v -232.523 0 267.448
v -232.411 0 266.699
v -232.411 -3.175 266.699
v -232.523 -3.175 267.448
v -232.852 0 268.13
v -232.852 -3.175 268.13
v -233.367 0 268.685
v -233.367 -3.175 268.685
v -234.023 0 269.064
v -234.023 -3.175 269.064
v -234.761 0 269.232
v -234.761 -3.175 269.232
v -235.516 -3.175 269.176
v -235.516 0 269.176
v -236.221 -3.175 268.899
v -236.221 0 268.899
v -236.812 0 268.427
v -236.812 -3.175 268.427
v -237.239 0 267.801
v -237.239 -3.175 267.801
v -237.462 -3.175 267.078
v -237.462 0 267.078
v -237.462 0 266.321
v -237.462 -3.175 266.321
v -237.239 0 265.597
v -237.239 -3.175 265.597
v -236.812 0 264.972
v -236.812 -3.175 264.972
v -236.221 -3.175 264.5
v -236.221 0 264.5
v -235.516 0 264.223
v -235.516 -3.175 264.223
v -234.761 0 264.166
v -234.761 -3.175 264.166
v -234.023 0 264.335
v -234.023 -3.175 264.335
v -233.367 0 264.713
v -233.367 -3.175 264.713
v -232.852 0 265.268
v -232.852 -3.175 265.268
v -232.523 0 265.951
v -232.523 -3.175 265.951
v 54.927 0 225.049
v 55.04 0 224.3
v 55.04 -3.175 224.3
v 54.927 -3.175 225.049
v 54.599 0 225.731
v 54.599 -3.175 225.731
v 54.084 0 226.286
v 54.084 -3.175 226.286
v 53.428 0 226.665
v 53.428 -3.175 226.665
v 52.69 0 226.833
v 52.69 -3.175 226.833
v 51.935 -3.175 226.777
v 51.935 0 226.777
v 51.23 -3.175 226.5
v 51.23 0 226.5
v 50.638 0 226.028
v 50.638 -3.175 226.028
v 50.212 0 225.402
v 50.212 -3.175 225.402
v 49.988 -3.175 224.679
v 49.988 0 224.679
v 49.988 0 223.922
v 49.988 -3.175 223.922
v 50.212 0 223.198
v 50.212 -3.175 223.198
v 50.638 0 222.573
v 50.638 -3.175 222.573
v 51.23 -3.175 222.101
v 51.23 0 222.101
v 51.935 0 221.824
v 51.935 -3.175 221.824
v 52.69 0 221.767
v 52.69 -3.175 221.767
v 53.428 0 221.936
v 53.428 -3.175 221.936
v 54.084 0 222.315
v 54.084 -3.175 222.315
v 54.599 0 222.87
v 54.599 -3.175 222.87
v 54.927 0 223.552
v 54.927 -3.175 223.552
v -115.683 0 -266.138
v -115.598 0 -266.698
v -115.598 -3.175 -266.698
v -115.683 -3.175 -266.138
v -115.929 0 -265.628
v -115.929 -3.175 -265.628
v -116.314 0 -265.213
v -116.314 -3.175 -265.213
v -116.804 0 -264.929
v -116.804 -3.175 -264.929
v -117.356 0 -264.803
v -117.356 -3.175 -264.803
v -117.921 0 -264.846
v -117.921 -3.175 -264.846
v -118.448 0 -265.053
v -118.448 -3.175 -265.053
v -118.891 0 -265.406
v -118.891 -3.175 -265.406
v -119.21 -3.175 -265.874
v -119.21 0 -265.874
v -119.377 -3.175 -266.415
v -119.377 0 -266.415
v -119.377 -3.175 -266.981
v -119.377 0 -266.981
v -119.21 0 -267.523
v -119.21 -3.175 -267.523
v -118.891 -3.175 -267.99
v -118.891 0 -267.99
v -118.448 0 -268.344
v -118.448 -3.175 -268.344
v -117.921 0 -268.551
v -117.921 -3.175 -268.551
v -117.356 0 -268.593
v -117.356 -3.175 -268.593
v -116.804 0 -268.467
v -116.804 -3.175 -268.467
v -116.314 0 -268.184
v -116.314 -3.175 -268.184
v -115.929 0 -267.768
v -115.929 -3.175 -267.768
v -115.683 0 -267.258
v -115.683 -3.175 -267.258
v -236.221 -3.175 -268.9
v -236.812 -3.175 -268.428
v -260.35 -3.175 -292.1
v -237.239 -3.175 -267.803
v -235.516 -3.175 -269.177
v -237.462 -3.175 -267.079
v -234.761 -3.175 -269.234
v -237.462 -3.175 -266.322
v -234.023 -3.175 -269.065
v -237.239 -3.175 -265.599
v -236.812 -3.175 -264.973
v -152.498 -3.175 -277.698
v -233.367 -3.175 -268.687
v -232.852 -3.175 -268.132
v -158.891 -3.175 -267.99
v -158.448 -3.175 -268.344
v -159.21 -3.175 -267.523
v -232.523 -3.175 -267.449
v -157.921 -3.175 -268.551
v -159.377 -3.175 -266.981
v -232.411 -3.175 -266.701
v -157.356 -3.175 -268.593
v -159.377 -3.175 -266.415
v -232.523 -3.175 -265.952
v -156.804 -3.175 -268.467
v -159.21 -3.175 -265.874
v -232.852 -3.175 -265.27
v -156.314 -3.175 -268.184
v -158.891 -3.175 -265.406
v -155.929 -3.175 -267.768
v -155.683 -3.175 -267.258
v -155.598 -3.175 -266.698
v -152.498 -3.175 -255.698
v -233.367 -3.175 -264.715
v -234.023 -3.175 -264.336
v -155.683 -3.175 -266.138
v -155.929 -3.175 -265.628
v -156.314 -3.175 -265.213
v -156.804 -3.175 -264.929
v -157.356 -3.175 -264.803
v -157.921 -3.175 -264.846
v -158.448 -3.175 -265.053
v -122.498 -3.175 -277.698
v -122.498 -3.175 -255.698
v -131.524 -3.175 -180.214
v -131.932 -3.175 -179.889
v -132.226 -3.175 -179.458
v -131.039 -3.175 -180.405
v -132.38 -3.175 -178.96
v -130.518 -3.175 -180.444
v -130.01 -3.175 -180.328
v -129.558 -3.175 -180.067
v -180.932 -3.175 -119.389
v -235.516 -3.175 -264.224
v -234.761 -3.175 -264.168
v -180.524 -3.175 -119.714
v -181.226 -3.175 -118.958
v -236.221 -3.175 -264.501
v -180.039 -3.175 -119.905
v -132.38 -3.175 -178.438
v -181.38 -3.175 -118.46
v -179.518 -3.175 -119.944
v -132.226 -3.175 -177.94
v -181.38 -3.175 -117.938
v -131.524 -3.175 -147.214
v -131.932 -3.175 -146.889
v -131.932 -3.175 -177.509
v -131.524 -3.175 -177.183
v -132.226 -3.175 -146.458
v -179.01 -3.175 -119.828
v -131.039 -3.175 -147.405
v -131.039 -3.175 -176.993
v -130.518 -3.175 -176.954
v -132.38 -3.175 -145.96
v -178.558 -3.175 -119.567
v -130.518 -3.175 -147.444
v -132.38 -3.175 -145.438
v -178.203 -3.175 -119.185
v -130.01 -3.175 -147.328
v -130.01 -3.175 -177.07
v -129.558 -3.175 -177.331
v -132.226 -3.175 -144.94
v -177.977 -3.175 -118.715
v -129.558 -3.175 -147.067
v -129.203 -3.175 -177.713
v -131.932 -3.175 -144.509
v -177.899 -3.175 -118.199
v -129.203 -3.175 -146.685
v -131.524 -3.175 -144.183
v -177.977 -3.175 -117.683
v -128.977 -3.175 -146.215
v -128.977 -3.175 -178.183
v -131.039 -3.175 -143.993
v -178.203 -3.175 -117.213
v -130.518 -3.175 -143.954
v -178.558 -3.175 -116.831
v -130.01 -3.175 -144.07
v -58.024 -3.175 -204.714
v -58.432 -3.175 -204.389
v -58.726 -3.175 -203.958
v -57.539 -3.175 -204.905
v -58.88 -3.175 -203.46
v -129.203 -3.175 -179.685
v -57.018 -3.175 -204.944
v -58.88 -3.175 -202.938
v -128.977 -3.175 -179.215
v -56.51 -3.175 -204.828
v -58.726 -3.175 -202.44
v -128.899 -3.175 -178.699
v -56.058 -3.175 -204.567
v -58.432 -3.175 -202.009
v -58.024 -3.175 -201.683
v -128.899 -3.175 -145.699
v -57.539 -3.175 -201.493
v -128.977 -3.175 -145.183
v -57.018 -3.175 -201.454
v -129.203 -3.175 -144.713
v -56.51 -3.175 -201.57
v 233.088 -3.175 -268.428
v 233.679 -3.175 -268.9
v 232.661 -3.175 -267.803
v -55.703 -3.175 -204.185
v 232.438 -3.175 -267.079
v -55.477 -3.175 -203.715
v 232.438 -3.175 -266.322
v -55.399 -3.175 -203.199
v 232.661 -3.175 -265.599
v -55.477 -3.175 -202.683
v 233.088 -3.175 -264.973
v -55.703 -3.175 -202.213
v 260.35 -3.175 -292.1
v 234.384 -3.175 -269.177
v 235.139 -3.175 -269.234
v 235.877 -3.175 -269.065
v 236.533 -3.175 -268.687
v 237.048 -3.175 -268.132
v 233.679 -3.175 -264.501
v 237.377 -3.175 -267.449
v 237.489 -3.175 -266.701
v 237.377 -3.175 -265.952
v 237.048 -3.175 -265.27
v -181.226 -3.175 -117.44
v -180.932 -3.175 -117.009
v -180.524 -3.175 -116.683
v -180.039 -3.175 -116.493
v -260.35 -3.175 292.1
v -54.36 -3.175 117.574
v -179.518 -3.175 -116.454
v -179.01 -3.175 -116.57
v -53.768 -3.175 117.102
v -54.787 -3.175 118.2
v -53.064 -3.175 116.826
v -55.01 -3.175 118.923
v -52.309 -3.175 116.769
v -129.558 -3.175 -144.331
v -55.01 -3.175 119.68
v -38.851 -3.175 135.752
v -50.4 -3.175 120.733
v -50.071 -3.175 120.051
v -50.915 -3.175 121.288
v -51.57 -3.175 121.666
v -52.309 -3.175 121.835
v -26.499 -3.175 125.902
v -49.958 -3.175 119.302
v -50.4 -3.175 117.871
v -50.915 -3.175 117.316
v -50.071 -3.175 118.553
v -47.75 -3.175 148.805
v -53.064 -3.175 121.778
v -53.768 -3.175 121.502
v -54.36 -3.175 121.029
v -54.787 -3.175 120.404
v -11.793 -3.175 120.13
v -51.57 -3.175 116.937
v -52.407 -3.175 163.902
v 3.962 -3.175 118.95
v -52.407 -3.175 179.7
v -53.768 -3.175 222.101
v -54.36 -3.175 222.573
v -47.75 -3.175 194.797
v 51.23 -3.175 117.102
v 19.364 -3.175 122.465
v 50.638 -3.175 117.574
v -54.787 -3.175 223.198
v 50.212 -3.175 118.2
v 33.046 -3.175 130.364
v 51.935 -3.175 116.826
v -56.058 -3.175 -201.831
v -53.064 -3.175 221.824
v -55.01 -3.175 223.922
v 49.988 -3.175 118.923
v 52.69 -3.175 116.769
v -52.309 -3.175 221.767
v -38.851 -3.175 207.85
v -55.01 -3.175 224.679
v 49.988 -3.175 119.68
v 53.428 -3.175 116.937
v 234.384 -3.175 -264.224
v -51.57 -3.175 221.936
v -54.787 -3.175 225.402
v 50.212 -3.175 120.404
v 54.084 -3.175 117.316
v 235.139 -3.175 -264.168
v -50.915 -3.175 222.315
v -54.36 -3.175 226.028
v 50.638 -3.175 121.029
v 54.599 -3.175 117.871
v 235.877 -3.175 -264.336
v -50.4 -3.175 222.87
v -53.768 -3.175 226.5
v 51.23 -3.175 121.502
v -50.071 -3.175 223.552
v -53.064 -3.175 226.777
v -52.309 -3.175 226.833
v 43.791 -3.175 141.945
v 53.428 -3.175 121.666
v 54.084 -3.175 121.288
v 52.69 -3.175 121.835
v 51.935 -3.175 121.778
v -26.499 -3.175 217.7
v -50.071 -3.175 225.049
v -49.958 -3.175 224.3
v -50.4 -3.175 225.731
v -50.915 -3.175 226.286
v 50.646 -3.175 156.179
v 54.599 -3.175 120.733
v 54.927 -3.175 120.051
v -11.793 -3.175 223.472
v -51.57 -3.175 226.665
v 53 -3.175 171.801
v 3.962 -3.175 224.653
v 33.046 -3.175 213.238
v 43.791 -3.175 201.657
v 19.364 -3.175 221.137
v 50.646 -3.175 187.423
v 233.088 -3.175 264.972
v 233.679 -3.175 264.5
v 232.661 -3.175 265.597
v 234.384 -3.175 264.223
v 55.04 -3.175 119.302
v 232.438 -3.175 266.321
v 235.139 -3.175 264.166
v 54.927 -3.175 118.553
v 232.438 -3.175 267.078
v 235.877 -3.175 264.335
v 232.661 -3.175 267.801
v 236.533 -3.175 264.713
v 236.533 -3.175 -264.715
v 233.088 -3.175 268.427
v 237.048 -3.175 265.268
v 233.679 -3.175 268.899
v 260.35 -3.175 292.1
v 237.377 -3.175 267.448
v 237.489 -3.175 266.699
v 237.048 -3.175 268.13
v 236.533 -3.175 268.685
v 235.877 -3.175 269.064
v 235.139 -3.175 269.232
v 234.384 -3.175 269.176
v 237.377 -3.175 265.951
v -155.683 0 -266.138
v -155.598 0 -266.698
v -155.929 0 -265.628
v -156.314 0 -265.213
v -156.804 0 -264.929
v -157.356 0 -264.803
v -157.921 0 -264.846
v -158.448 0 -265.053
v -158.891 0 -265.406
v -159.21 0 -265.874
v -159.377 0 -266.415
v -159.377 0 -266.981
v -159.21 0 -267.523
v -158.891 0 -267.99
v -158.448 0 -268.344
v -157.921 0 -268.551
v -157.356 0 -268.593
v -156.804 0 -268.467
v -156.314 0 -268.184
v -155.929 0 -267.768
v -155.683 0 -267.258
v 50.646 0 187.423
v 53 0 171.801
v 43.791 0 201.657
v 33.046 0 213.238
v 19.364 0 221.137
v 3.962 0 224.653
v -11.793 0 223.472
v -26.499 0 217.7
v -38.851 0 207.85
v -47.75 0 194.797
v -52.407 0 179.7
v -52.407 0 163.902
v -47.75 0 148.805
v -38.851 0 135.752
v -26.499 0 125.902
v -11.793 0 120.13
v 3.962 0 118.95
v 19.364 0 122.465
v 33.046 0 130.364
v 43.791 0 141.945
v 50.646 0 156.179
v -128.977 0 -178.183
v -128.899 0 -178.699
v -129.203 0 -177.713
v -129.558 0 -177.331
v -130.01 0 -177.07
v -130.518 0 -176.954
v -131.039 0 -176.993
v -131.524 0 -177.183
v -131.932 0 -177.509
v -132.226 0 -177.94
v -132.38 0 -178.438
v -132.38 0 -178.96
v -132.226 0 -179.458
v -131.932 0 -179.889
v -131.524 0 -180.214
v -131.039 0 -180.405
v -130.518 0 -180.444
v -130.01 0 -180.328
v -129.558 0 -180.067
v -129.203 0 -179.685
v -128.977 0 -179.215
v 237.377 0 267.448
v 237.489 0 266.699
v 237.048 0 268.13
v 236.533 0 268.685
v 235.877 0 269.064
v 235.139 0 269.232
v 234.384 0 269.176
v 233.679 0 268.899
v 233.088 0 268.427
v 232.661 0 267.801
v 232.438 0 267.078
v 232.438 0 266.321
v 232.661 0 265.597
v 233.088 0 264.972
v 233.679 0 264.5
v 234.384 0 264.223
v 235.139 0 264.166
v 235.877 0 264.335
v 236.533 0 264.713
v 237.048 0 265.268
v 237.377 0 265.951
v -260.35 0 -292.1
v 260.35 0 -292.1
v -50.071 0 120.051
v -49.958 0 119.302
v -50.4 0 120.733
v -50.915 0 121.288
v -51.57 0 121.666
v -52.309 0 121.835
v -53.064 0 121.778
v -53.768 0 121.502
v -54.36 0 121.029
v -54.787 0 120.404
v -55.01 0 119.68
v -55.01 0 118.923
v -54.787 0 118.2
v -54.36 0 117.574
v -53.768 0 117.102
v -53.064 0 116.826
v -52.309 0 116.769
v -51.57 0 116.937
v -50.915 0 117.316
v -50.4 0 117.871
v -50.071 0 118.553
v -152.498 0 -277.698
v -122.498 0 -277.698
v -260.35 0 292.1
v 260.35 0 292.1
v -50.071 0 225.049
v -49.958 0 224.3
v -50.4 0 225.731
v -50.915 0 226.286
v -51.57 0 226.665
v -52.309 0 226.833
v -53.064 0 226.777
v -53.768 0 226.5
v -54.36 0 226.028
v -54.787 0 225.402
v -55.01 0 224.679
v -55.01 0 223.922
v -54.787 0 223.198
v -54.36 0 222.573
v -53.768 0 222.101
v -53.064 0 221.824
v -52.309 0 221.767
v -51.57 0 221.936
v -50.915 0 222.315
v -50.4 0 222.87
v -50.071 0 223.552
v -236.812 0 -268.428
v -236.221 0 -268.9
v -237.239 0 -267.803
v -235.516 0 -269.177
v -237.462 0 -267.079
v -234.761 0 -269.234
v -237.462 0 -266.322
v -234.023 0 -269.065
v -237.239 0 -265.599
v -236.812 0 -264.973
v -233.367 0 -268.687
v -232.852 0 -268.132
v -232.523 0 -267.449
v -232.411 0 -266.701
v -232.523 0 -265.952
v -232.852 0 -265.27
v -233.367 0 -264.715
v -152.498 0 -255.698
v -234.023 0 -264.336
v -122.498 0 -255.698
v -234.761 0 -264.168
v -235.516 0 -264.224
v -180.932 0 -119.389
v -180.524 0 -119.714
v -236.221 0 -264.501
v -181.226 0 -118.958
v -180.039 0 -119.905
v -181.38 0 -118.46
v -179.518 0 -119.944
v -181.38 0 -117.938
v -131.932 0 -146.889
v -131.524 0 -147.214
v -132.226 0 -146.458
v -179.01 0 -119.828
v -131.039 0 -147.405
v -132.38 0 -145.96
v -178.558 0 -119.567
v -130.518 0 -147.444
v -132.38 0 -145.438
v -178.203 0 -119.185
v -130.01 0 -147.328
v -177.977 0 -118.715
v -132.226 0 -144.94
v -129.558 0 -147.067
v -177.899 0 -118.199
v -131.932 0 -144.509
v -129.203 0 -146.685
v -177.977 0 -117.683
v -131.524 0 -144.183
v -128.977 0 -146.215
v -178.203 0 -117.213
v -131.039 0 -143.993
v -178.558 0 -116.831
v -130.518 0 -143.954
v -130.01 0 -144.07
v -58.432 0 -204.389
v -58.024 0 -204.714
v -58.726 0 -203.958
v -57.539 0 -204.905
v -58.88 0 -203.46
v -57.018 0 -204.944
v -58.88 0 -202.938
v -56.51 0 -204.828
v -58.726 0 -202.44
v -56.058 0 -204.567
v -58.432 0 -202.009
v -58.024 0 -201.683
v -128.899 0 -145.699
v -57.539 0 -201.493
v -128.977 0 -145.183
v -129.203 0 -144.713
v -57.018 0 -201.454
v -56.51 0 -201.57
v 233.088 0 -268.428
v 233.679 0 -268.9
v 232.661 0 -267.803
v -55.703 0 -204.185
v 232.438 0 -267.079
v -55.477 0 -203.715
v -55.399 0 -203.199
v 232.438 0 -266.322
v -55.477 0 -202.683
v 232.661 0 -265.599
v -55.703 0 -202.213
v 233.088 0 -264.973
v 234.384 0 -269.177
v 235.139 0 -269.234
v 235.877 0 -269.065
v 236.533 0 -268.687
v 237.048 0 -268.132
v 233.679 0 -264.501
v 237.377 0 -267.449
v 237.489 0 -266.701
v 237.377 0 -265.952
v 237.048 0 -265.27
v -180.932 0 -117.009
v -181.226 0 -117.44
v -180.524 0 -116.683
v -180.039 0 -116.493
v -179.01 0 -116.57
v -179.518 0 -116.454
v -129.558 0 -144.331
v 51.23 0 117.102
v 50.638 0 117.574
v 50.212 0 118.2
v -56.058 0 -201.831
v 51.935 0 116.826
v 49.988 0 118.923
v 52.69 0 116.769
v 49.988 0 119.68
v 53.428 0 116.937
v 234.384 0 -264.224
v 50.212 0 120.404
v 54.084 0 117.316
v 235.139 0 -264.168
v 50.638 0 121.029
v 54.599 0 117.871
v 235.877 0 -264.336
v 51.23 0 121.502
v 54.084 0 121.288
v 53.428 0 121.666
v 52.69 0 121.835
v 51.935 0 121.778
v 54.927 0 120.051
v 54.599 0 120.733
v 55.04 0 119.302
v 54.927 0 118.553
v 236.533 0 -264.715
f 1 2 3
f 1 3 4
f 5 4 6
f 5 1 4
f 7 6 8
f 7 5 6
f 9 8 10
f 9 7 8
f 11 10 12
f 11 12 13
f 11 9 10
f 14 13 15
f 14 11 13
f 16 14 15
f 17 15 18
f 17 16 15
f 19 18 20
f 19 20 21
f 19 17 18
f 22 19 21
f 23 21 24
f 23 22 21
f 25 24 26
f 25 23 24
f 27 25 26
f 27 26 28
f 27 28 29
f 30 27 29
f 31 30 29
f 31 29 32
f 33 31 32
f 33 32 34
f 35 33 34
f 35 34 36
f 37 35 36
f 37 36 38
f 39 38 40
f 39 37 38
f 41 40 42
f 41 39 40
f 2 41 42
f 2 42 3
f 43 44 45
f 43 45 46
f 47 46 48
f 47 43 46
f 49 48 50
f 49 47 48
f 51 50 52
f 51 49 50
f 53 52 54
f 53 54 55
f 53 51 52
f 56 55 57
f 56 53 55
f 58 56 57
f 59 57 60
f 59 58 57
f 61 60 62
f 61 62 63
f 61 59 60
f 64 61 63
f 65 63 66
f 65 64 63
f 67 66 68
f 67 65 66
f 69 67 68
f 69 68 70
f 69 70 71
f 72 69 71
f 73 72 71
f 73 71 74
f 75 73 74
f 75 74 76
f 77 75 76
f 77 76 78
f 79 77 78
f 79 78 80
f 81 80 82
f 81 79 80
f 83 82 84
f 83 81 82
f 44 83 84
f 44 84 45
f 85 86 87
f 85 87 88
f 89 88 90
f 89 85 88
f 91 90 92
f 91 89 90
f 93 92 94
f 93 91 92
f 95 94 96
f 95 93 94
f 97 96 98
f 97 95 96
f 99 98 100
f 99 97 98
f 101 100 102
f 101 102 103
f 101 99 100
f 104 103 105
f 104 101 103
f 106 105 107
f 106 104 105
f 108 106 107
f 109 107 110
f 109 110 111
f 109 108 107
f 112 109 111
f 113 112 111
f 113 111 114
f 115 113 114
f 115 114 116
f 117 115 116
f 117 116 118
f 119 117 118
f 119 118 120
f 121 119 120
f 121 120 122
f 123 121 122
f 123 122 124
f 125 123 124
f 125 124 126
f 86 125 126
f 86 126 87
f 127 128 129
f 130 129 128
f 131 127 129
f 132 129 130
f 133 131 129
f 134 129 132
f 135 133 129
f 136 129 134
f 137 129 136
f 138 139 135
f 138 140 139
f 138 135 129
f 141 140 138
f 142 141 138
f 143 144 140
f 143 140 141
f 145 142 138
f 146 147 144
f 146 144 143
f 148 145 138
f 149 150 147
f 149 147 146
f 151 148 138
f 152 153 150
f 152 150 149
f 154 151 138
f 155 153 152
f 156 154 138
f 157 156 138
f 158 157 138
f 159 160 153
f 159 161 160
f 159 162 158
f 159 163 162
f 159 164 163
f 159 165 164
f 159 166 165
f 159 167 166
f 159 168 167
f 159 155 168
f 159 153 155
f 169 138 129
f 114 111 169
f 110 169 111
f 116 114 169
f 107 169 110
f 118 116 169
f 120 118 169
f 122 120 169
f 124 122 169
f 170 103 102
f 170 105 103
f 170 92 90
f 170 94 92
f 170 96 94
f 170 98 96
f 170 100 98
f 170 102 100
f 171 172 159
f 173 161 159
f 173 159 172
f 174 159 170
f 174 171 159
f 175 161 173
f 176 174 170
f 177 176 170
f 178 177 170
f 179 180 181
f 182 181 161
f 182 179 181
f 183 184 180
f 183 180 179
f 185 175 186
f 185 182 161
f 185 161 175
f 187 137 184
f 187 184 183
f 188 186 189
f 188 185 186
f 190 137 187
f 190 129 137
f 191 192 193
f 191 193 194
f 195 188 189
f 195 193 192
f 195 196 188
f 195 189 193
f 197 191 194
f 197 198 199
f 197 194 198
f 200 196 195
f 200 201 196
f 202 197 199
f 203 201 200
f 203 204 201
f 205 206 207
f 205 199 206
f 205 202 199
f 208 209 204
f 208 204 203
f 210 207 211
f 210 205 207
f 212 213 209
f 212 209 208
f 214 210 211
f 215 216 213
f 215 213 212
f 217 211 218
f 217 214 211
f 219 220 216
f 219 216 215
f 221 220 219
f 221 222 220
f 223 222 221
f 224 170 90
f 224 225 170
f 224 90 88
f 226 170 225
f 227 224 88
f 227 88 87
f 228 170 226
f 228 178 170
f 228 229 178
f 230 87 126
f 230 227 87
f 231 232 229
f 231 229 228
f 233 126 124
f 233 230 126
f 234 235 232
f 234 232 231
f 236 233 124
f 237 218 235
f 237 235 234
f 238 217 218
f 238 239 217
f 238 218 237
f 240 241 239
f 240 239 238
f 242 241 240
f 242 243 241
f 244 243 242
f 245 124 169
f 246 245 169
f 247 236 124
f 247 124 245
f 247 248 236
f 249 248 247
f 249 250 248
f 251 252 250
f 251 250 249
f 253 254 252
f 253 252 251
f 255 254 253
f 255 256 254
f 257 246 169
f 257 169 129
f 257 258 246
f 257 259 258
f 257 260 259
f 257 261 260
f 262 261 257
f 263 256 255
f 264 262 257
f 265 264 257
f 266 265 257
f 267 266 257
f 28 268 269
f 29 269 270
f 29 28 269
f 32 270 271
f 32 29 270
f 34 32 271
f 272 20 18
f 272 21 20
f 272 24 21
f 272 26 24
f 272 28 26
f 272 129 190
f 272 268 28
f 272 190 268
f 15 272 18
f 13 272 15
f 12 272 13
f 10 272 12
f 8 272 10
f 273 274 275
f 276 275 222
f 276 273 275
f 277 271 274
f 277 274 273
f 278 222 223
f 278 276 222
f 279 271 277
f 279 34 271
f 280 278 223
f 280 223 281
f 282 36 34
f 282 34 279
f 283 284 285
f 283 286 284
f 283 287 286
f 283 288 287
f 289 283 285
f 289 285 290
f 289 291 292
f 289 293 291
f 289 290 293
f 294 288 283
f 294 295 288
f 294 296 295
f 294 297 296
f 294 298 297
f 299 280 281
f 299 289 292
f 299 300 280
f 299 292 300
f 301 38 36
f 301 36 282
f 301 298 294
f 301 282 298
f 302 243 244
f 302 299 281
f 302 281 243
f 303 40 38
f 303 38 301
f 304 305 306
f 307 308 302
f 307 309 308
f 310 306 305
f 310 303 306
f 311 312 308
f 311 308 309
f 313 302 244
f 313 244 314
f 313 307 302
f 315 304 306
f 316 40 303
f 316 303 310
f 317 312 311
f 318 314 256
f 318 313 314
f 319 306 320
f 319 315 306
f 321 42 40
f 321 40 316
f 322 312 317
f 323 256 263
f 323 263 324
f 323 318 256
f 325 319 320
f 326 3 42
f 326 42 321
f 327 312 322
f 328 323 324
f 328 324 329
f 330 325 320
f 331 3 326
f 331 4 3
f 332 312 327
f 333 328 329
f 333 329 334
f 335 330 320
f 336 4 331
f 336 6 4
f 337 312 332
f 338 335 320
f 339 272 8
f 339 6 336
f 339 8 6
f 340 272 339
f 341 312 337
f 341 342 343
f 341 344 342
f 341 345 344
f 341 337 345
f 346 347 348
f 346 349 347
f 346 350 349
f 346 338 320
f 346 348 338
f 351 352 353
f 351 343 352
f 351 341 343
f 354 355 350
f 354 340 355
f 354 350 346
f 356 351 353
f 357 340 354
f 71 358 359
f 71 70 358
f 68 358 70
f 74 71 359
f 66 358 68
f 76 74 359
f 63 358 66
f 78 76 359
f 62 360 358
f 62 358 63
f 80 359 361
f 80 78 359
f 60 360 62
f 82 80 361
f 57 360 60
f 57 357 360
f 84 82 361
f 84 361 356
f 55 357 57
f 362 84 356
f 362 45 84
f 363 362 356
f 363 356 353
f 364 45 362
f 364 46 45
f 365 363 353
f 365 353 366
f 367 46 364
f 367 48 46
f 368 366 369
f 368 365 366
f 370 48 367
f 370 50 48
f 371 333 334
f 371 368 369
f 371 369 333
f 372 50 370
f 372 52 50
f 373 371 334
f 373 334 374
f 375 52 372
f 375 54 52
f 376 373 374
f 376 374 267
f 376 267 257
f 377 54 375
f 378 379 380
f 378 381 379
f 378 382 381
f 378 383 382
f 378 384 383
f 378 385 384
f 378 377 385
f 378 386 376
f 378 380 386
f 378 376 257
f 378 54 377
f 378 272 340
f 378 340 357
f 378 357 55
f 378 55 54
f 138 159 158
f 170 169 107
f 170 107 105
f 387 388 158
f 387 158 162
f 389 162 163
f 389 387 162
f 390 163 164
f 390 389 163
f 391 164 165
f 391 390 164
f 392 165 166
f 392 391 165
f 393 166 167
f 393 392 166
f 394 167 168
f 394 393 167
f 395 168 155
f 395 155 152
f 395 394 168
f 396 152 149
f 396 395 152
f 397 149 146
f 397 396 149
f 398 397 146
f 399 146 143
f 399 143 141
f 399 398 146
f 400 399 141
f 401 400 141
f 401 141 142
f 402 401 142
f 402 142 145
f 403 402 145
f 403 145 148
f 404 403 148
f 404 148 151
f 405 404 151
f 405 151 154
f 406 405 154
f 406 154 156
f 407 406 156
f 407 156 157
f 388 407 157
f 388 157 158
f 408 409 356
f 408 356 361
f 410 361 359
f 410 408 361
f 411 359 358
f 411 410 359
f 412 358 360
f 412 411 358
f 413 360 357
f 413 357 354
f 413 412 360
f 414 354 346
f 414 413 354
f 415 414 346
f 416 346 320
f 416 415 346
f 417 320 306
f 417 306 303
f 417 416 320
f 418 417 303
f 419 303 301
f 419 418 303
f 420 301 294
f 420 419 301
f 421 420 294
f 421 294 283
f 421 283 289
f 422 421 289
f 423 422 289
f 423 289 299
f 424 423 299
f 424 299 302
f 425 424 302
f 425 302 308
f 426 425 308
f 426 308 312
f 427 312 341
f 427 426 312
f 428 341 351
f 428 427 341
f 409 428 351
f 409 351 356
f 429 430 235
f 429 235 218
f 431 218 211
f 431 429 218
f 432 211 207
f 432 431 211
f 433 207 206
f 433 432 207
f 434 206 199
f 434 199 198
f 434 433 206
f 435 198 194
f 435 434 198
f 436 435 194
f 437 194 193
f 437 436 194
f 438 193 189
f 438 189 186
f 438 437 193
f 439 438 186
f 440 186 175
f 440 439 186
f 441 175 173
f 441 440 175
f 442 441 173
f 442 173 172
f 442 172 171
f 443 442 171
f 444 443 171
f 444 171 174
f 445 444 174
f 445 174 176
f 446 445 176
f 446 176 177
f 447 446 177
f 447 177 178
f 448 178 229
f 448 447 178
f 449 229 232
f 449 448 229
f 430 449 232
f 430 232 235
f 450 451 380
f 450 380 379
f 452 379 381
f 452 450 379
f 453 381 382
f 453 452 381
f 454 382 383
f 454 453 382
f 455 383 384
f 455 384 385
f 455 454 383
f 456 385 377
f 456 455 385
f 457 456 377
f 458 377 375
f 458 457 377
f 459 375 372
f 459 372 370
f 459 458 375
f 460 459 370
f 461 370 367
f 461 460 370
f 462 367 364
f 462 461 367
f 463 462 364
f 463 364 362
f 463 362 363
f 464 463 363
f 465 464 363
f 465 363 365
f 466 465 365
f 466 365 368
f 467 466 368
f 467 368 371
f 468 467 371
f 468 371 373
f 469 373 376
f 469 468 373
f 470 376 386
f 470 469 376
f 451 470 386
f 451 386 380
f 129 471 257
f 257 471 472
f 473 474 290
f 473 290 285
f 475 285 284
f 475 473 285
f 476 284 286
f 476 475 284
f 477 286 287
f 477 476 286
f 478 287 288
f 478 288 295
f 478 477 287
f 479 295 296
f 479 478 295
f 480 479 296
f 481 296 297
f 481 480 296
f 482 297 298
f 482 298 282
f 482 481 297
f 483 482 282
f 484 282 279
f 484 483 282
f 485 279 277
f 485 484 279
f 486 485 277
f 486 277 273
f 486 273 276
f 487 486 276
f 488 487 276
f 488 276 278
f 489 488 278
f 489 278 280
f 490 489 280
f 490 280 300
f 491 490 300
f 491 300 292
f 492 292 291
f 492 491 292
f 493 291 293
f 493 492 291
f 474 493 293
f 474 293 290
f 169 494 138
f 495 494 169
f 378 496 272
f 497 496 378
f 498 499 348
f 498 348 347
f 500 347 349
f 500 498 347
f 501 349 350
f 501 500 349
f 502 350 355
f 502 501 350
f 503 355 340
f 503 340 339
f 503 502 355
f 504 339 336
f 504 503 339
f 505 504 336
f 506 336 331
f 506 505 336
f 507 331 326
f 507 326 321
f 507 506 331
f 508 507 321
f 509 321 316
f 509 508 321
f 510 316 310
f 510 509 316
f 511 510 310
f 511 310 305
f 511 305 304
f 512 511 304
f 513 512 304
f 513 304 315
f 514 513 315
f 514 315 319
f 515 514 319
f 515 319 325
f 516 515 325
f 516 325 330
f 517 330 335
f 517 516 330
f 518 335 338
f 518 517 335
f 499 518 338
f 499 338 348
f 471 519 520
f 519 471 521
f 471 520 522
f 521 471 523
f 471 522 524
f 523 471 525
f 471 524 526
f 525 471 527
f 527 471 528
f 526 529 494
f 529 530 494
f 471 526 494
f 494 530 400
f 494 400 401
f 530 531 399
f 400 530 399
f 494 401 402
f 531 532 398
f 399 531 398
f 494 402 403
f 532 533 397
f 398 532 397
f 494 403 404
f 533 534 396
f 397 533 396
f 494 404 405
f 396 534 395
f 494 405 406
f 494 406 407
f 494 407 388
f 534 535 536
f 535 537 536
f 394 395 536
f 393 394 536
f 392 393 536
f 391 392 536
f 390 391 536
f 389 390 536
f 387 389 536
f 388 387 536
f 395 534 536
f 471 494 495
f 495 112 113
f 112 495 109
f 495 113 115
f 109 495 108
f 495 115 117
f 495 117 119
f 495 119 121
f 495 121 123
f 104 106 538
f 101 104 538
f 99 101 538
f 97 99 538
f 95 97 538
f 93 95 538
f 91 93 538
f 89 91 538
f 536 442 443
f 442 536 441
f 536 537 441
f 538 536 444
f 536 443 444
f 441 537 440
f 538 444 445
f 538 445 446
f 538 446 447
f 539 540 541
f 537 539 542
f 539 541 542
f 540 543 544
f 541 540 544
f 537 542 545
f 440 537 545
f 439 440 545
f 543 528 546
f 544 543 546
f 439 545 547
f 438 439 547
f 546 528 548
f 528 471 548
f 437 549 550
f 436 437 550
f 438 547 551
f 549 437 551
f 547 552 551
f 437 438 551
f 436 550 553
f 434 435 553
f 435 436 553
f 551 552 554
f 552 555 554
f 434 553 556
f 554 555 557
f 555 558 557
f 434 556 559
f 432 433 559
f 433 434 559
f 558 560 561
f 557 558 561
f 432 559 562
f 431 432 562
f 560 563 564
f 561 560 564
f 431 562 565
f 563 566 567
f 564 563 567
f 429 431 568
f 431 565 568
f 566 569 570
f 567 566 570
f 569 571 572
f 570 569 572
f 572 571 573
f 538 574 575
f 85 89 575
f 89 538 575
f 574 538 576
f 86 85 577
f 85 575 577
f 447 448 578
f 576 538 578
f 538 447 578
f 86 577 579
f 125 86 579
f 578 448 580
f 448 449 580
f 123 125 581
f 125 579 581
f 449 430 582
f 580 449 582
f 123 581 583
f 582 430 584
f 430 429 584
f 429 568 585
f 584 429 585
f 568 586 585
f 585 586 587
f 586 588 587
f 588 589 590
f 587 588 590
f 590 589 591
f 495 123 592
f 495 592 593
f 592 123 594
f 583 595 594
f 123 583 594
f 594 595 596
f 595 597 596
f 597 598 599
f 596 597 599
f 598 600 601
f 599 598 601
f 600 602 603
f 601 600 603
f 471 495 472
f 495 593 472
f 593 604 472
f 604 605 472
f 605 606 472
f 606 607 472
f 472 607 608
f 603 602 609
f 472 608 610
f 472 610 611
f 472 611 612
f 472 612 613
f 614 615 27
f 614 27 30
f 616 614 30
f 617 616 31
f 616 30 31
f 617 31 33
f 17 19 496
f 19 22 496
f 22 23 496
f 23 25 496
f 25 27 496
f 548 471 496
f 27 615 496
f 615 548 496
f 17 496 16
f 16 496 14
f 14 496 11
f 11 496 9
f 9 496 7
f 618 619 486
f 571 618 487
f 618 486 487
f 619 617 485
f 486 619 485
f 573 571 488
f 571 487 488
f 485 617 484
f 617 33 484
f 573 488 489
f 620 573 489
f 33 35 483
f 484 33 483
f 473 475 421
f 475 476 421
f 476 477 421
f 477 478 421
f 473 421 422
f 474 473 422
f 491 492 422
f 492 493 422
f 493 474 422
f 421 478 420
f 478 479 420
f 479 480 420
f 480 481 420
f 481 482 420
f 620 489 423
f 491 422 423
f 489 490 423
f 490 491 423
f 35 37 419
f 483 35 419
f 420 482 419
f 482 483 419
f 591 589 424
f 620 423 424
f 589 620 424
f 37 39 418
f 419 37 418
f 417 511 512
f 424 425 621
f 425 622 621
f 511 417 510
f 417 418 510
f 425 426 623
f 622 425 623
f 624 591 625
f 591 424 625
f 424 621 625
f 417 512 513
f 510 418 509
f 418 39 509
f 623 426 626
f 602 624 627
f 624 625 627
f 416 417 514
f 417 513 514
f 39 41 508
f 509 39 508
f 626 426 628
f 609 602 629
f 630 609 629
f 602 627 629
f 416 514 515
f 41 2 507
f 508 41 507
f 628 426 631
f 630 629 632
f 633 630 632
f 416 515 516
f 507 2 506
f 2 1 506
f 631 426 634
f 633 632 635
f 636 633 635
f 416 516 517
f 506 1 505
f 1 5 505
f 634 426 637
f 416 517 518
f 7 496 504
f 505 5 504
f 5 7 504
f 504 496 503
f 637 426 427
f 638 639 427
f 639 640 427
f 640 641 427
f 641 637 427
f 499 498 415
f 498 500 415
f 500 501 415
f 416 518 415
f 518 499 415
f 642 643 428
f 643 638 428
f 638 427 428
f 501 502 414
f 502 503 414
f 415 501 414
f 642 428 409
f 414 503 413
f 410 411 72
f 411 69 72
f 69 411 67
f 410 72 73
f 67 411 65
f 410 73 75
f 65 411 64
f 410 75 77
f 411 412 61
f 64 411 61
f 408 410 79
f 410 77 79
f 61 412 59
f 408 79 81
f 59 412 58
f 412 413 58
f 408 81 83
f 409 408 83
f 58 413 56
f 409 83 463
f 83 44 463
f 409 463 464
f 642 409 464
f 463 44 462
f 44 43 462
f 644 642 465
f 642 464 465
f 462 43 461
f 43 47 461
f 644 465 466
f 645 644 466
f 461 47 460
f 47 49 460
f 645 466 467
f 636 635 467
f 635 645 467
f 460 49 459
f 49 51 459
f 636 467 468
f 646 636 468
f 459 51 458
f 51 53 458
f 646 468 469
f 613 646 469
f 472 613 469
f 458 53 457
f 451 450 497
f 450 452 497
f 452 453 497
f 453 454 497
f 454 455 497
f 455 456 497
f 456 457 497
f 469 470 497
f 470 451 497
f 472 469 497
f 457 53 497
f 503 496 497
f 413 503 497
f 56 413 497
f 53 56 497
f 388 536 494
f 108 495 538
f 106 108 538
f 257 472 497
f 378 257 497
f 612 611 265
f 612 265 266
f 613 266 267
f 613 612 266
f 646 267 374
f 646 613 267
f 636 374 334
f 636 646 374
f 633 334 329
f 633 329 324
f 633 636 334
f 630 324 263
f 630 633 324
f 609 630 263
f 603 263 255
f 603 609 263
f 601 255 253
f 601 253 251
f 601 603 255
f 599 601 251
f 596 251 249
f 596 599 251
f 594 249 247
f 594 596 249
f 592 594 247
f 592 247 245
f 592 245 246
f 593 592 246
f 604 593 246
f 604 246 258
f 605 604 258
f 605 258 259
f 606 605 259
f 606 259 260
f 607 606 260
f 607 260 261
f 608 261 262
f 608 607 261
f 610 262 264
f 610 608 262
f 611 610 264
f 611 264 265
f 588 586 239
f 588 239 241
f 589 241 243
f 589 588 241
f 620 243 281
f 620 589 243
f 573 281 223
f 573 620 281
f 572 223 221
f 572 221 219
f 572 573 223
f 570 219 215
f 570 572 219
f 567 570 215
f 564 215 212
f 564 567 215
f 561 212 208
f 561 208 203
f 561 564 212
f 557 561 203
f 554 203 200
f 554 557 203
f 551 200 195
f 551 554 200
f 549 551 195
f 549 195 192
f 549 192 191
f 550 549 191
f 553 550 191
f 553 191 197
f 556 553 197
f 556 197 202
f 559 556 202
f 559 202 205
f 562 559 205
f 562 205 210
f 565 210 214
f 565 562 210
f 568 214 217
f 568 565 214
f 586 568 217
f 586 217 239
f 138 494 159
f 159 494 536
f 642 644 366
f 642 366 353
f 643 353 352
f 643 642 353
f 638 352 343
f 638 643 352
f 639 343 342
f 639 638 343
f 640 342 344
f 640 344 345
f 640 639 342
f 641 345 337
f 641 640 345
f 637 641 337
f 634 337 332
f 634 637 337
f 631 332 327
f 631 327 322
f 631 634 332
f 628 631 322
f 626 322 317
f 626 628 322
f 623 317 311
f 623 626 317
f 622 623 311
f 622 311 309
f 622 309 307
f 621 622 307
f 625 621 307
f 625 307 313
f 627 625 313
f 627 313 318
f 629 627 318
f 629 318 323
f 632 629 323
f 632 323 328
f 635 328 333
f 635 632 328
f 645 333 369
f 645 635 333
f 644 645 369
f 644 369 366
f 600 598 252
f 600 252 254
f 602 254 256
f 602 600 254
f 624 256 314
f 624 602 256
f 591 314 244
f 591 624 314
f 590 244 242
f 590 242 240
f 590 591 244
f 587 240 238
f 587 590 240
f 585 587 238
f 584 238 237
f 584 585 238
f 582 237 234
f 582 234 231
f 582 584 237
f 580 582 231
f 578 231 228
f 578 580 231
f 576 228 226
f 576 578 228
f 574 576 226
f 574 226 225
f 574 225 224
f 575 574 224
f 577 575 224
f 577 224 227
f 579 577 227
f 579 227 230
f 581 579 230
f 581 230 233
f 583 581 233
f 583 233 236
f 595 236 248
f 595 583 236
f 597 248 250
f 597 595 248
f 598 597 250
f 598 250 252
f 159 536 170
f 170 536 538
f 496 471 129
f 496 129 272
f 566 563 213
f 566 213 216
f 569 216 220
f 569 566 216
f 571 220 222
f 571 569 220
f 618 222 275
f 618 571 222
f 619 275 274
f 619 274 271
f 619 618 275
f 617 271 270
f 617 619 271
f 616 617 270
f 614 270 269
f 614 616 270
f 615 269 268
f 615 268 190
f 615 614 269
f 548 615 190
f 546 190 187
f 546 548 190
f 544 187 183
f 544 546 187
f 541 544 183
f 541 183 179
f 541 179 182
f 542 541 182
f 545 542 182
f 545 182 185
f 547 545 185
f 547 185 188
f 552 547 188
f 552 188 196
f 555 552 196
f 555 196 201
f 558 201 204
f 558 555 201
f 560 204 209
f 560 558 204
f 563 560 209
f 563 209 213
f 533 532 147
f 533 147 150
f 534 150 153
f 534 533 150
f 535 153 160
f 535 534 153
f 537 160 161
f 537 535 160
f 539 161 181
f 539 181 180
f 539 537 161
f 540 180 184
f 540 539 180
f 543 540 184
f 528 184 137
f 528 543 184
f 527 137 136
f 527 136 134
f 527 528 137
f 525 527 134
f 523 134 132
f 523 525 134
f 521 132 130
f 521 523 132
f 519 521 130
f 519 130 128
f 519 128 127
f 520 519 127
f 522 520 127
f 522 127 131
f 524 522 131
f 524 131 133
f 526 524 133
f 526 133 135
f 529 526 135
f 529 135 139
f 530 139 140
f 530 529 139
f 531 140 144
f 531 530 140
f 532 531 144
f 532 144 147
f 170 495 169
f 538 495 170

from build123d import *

# Parameters (mm, degrees)
SKETCH_W          = 520.7
SKETCH_H          = 584.2
PAD_DEPTH         = 3.175
CYLINDER_R        = 1.75
CYLINDER_DEPTH    = 3.175
CYLINDER001_R     = 1.75
CYLINDER001_DEPTH = 3.175
CYLINDER002_R     = 1.75
CYLINDER002_DEPTH = 3.175
CYLINDER003_R     = 1.75
CYLINDER003_DEPTH = 3.175
CYLINDER004_R     = 52.9996
CYLINDER004_DEPTH = 3.175
CYLINDER005_R     = 2.54
CYLINDER005_DEPTH = 3.175
CYLINDER006_R     = 2.54
CYLINDER006_DEPTH = 3.175
CYLINDER007_R     = 2.54
CYLINDER007_DEPTH = 3.175
CYLINDER008_R     = 2.54
CYLINDER008_DEPTH = 3.175
BOX_W             = 30
BOX_H             = 22
BOX_DEPTH         = 3.2
CYLINDER009_R     = 1.9
CYLINDER009_DEPTH = 3.2
CYLINDER010_R     = 1.9
CYLINDER010_DEPTH = 3.2
CYLINDER011_R     = 2.54
CYLINDER011_DEPTH = 3.175
CYLINDER012_R     = 2.54
CYLINDER012_DEPTH = 3.175
CYLINDER013_R     = 2.54
CYLINDER013_DEPTH = 3.175
CYLINDER014_R     = 2.54
CYLINDER014_DEPTH = 3.175


with BuildPart() as part:
    # Sketch → Pad (new body)
    with BuildSketch(Plane.XZ):
        Rectangle(SKETCH_W, SKETCH_H)
    extrude(amount=PAD_DEPTH)

    # Cylinder → Cylinder (cut)
    with BuildSketch(Plane(origin=(-179.64912, 0, -118.1989), x_dir=(1, 0, 0), z_dir=(0, -1, 0))):
        Circle(CYLINDER_R)
    extrude(amount=CYLINDER_DEPTH, mode=Mode.SUBTRACT)

    # Cylinder001 → Cylinder001 (cut)
    with BuildSketch(Plane(origin=(-57.14912, 0, -203.1989), x_dir=(1, 0, 0), z_dir=(0, -1, 0))):
        Circle(CYLINDER001_R)
    extrude(amount=CYLINDER001_DEPTH, mode=Mode.SUBTRACT)

    # Cylinder002 → Cylinder002 (cut)
    with BuildSketch(Plane(origin=(-130.64912, 0, -178.6989), x_dir=(1, 0, 0), z_dir=(0, -1, 0))):
        Circle(CYLINDER002_R)
    extrude(amount=CYLINDER002_DEPTH, mode=Mode.SUBTRACT)

    # Cylinder003 → Cylinder003 (cut)
    with BuildSketch(Plane(origin=(-130.64912, 0, -145.6989), x_dir=(1, 0, 0), z_dir=(0, -1, 0))):
        Circle(CYLINDER003_R)
    extrude(amount=CYLINDER003_DEPTH, mode=Mode.SUBTRACT)

    # Cylinder004 → Cylinder004 (cut)
    with BuildSketch(Plane(origin=(0.00086, 0, 171.8011), x_dir=(1, 0, 0), z_dir=(0, -1, 0))):
        Circle(CYLINDER004_R)
    extrude(amount=CYLINDER004_DEPTH, mode=Mode.SUBTRACT)

    # Cylinder005 → Cylinder005 (cut)
    with BuildSketch(Plane(origin=(-52.4984, 0, 224.30036), x_dir=(1, 0, 0), z_dir=(0, -1, 0))):
        Circle(CYLINDER005_R)
    extrude(amount=CYLINDER005_DEPTH, mode=Mode.SUBTRACT)

    # Cylinder006 → Cylinder006 (cut)
    with BuildSketch(Plane(origin=(52.50012, 0, 224.30036), x_dir=(1, 0, 0), z_dir=(0, -1, 0))):
        Circle(CYLINDER006_R)
    extrude(amount=CYLINDER006_DEPTH, mode=Mode.SUBTRACT)

    # Cylinder007 → Cylinder007 (cut)
    with BuildSketch(Plane(origin=(52.50012, 0, 119.30184), x_dir=(1, 0, 0), z_dir=(0, -1, 0))):
        Circle(CYLINDER007_R)
    extrude(amount=CYLINDER007_DEPTH, mode=Mode.SUBTRACT)

    # Cylinder008 → Cylinder008 (cut)
    with BuildSketch(Plane(origin=(-52.4984, 0, 119.30184), x_dir=(1, 0, 0), z_dir=(0, -1, 0))):
        Circle(CYLINDER008_R)
    extrude(amount=CYLINDER008_DEPTH, mode=Mode.SUBTRACT)

    # Box → Box (cut)
    with BuildSketch(Plane(origin=(-152.4984, 0.025, -277.69816), x_dir=(1, 0, 0), z_dir=(0, -1, 0))):
        with Locations((15, 11)):
            Rectangle(BOX_W, BOX_H)
    extrude(amount=BOX_DEPTH, mode=Mode.SUBTRACT)

    # Cylinder009 → Cylinder009 (cut)
    with BuildSketch(Plane(origin=(-157.4984, 0.025, -266.69816), x_dir=(1, 0, 0), z_dir=(0, -1, 0))):
        Circle(CYLINDER009_R)
    extrude(amount=CYLINDER009_DEPTH, mode=Mode.SUBTRACT)

    # Cylinder010 → Cylinder010 (cut)
    with BuildSketch(Plane(origin=(-117.4984, 0.025, -266.69816), x_dir=(1, 0, 0), z_dir=(0, -1, 0))):
        Circle(CYLINDER010_R)
    extrude(amount=CYLINDER010_DEPTH, mode=Mode.SUBTRACT)

    # Cylinder011 → Cylinder011 (cut)
    with BuildSketch(Plane(origin=(-234.95054, 0, -266.7007), x_dir=(1, 0, 0), z_dir=(0, -1, 0))):
        Circle(CYLINDER011_R)
    extrude(amount=CYLINDER011_DEPTH, mode=Mode.SUBTRACT)

    # Cylinder012 → Cylinder012 (cut)
    with BuildSketch(Plane(origin=(-234.95054, 0, 266.6993), x_dir=(1, 0, 0), z_dir=(0, -1, 0))):
        Circle(CYLINDER012_R)
    extrude(amount=CYLINDER012_DEPTH, mode=Mode.SUBTRACT)

    # Cylinder013 → Cylinder013 (cut)
    with BuildSketch(Plane(origin=(234.94946, 0, 266.6993), x_dir=(1, 0, 0), z_dir=(0, -1, 0))):
        Circle(CYLINDER013_R)
    extrude(amount=CYLINDER013_DEPTH, mode=Mode.SUBTRACT)

    # Cylinder014 → Cylinder014 (cut)
    with BuildSketch(Plane(origin=(234.94946, 0, -266.7007), x_dir=(1, 0, 0), z_dir=(0, -1, 0))):
        Circle(CYLINDER014_R)
    extrude(amount=CYLINDER014_DEPTH, mode=Mode.SUBTRACT)


solid = part.part
